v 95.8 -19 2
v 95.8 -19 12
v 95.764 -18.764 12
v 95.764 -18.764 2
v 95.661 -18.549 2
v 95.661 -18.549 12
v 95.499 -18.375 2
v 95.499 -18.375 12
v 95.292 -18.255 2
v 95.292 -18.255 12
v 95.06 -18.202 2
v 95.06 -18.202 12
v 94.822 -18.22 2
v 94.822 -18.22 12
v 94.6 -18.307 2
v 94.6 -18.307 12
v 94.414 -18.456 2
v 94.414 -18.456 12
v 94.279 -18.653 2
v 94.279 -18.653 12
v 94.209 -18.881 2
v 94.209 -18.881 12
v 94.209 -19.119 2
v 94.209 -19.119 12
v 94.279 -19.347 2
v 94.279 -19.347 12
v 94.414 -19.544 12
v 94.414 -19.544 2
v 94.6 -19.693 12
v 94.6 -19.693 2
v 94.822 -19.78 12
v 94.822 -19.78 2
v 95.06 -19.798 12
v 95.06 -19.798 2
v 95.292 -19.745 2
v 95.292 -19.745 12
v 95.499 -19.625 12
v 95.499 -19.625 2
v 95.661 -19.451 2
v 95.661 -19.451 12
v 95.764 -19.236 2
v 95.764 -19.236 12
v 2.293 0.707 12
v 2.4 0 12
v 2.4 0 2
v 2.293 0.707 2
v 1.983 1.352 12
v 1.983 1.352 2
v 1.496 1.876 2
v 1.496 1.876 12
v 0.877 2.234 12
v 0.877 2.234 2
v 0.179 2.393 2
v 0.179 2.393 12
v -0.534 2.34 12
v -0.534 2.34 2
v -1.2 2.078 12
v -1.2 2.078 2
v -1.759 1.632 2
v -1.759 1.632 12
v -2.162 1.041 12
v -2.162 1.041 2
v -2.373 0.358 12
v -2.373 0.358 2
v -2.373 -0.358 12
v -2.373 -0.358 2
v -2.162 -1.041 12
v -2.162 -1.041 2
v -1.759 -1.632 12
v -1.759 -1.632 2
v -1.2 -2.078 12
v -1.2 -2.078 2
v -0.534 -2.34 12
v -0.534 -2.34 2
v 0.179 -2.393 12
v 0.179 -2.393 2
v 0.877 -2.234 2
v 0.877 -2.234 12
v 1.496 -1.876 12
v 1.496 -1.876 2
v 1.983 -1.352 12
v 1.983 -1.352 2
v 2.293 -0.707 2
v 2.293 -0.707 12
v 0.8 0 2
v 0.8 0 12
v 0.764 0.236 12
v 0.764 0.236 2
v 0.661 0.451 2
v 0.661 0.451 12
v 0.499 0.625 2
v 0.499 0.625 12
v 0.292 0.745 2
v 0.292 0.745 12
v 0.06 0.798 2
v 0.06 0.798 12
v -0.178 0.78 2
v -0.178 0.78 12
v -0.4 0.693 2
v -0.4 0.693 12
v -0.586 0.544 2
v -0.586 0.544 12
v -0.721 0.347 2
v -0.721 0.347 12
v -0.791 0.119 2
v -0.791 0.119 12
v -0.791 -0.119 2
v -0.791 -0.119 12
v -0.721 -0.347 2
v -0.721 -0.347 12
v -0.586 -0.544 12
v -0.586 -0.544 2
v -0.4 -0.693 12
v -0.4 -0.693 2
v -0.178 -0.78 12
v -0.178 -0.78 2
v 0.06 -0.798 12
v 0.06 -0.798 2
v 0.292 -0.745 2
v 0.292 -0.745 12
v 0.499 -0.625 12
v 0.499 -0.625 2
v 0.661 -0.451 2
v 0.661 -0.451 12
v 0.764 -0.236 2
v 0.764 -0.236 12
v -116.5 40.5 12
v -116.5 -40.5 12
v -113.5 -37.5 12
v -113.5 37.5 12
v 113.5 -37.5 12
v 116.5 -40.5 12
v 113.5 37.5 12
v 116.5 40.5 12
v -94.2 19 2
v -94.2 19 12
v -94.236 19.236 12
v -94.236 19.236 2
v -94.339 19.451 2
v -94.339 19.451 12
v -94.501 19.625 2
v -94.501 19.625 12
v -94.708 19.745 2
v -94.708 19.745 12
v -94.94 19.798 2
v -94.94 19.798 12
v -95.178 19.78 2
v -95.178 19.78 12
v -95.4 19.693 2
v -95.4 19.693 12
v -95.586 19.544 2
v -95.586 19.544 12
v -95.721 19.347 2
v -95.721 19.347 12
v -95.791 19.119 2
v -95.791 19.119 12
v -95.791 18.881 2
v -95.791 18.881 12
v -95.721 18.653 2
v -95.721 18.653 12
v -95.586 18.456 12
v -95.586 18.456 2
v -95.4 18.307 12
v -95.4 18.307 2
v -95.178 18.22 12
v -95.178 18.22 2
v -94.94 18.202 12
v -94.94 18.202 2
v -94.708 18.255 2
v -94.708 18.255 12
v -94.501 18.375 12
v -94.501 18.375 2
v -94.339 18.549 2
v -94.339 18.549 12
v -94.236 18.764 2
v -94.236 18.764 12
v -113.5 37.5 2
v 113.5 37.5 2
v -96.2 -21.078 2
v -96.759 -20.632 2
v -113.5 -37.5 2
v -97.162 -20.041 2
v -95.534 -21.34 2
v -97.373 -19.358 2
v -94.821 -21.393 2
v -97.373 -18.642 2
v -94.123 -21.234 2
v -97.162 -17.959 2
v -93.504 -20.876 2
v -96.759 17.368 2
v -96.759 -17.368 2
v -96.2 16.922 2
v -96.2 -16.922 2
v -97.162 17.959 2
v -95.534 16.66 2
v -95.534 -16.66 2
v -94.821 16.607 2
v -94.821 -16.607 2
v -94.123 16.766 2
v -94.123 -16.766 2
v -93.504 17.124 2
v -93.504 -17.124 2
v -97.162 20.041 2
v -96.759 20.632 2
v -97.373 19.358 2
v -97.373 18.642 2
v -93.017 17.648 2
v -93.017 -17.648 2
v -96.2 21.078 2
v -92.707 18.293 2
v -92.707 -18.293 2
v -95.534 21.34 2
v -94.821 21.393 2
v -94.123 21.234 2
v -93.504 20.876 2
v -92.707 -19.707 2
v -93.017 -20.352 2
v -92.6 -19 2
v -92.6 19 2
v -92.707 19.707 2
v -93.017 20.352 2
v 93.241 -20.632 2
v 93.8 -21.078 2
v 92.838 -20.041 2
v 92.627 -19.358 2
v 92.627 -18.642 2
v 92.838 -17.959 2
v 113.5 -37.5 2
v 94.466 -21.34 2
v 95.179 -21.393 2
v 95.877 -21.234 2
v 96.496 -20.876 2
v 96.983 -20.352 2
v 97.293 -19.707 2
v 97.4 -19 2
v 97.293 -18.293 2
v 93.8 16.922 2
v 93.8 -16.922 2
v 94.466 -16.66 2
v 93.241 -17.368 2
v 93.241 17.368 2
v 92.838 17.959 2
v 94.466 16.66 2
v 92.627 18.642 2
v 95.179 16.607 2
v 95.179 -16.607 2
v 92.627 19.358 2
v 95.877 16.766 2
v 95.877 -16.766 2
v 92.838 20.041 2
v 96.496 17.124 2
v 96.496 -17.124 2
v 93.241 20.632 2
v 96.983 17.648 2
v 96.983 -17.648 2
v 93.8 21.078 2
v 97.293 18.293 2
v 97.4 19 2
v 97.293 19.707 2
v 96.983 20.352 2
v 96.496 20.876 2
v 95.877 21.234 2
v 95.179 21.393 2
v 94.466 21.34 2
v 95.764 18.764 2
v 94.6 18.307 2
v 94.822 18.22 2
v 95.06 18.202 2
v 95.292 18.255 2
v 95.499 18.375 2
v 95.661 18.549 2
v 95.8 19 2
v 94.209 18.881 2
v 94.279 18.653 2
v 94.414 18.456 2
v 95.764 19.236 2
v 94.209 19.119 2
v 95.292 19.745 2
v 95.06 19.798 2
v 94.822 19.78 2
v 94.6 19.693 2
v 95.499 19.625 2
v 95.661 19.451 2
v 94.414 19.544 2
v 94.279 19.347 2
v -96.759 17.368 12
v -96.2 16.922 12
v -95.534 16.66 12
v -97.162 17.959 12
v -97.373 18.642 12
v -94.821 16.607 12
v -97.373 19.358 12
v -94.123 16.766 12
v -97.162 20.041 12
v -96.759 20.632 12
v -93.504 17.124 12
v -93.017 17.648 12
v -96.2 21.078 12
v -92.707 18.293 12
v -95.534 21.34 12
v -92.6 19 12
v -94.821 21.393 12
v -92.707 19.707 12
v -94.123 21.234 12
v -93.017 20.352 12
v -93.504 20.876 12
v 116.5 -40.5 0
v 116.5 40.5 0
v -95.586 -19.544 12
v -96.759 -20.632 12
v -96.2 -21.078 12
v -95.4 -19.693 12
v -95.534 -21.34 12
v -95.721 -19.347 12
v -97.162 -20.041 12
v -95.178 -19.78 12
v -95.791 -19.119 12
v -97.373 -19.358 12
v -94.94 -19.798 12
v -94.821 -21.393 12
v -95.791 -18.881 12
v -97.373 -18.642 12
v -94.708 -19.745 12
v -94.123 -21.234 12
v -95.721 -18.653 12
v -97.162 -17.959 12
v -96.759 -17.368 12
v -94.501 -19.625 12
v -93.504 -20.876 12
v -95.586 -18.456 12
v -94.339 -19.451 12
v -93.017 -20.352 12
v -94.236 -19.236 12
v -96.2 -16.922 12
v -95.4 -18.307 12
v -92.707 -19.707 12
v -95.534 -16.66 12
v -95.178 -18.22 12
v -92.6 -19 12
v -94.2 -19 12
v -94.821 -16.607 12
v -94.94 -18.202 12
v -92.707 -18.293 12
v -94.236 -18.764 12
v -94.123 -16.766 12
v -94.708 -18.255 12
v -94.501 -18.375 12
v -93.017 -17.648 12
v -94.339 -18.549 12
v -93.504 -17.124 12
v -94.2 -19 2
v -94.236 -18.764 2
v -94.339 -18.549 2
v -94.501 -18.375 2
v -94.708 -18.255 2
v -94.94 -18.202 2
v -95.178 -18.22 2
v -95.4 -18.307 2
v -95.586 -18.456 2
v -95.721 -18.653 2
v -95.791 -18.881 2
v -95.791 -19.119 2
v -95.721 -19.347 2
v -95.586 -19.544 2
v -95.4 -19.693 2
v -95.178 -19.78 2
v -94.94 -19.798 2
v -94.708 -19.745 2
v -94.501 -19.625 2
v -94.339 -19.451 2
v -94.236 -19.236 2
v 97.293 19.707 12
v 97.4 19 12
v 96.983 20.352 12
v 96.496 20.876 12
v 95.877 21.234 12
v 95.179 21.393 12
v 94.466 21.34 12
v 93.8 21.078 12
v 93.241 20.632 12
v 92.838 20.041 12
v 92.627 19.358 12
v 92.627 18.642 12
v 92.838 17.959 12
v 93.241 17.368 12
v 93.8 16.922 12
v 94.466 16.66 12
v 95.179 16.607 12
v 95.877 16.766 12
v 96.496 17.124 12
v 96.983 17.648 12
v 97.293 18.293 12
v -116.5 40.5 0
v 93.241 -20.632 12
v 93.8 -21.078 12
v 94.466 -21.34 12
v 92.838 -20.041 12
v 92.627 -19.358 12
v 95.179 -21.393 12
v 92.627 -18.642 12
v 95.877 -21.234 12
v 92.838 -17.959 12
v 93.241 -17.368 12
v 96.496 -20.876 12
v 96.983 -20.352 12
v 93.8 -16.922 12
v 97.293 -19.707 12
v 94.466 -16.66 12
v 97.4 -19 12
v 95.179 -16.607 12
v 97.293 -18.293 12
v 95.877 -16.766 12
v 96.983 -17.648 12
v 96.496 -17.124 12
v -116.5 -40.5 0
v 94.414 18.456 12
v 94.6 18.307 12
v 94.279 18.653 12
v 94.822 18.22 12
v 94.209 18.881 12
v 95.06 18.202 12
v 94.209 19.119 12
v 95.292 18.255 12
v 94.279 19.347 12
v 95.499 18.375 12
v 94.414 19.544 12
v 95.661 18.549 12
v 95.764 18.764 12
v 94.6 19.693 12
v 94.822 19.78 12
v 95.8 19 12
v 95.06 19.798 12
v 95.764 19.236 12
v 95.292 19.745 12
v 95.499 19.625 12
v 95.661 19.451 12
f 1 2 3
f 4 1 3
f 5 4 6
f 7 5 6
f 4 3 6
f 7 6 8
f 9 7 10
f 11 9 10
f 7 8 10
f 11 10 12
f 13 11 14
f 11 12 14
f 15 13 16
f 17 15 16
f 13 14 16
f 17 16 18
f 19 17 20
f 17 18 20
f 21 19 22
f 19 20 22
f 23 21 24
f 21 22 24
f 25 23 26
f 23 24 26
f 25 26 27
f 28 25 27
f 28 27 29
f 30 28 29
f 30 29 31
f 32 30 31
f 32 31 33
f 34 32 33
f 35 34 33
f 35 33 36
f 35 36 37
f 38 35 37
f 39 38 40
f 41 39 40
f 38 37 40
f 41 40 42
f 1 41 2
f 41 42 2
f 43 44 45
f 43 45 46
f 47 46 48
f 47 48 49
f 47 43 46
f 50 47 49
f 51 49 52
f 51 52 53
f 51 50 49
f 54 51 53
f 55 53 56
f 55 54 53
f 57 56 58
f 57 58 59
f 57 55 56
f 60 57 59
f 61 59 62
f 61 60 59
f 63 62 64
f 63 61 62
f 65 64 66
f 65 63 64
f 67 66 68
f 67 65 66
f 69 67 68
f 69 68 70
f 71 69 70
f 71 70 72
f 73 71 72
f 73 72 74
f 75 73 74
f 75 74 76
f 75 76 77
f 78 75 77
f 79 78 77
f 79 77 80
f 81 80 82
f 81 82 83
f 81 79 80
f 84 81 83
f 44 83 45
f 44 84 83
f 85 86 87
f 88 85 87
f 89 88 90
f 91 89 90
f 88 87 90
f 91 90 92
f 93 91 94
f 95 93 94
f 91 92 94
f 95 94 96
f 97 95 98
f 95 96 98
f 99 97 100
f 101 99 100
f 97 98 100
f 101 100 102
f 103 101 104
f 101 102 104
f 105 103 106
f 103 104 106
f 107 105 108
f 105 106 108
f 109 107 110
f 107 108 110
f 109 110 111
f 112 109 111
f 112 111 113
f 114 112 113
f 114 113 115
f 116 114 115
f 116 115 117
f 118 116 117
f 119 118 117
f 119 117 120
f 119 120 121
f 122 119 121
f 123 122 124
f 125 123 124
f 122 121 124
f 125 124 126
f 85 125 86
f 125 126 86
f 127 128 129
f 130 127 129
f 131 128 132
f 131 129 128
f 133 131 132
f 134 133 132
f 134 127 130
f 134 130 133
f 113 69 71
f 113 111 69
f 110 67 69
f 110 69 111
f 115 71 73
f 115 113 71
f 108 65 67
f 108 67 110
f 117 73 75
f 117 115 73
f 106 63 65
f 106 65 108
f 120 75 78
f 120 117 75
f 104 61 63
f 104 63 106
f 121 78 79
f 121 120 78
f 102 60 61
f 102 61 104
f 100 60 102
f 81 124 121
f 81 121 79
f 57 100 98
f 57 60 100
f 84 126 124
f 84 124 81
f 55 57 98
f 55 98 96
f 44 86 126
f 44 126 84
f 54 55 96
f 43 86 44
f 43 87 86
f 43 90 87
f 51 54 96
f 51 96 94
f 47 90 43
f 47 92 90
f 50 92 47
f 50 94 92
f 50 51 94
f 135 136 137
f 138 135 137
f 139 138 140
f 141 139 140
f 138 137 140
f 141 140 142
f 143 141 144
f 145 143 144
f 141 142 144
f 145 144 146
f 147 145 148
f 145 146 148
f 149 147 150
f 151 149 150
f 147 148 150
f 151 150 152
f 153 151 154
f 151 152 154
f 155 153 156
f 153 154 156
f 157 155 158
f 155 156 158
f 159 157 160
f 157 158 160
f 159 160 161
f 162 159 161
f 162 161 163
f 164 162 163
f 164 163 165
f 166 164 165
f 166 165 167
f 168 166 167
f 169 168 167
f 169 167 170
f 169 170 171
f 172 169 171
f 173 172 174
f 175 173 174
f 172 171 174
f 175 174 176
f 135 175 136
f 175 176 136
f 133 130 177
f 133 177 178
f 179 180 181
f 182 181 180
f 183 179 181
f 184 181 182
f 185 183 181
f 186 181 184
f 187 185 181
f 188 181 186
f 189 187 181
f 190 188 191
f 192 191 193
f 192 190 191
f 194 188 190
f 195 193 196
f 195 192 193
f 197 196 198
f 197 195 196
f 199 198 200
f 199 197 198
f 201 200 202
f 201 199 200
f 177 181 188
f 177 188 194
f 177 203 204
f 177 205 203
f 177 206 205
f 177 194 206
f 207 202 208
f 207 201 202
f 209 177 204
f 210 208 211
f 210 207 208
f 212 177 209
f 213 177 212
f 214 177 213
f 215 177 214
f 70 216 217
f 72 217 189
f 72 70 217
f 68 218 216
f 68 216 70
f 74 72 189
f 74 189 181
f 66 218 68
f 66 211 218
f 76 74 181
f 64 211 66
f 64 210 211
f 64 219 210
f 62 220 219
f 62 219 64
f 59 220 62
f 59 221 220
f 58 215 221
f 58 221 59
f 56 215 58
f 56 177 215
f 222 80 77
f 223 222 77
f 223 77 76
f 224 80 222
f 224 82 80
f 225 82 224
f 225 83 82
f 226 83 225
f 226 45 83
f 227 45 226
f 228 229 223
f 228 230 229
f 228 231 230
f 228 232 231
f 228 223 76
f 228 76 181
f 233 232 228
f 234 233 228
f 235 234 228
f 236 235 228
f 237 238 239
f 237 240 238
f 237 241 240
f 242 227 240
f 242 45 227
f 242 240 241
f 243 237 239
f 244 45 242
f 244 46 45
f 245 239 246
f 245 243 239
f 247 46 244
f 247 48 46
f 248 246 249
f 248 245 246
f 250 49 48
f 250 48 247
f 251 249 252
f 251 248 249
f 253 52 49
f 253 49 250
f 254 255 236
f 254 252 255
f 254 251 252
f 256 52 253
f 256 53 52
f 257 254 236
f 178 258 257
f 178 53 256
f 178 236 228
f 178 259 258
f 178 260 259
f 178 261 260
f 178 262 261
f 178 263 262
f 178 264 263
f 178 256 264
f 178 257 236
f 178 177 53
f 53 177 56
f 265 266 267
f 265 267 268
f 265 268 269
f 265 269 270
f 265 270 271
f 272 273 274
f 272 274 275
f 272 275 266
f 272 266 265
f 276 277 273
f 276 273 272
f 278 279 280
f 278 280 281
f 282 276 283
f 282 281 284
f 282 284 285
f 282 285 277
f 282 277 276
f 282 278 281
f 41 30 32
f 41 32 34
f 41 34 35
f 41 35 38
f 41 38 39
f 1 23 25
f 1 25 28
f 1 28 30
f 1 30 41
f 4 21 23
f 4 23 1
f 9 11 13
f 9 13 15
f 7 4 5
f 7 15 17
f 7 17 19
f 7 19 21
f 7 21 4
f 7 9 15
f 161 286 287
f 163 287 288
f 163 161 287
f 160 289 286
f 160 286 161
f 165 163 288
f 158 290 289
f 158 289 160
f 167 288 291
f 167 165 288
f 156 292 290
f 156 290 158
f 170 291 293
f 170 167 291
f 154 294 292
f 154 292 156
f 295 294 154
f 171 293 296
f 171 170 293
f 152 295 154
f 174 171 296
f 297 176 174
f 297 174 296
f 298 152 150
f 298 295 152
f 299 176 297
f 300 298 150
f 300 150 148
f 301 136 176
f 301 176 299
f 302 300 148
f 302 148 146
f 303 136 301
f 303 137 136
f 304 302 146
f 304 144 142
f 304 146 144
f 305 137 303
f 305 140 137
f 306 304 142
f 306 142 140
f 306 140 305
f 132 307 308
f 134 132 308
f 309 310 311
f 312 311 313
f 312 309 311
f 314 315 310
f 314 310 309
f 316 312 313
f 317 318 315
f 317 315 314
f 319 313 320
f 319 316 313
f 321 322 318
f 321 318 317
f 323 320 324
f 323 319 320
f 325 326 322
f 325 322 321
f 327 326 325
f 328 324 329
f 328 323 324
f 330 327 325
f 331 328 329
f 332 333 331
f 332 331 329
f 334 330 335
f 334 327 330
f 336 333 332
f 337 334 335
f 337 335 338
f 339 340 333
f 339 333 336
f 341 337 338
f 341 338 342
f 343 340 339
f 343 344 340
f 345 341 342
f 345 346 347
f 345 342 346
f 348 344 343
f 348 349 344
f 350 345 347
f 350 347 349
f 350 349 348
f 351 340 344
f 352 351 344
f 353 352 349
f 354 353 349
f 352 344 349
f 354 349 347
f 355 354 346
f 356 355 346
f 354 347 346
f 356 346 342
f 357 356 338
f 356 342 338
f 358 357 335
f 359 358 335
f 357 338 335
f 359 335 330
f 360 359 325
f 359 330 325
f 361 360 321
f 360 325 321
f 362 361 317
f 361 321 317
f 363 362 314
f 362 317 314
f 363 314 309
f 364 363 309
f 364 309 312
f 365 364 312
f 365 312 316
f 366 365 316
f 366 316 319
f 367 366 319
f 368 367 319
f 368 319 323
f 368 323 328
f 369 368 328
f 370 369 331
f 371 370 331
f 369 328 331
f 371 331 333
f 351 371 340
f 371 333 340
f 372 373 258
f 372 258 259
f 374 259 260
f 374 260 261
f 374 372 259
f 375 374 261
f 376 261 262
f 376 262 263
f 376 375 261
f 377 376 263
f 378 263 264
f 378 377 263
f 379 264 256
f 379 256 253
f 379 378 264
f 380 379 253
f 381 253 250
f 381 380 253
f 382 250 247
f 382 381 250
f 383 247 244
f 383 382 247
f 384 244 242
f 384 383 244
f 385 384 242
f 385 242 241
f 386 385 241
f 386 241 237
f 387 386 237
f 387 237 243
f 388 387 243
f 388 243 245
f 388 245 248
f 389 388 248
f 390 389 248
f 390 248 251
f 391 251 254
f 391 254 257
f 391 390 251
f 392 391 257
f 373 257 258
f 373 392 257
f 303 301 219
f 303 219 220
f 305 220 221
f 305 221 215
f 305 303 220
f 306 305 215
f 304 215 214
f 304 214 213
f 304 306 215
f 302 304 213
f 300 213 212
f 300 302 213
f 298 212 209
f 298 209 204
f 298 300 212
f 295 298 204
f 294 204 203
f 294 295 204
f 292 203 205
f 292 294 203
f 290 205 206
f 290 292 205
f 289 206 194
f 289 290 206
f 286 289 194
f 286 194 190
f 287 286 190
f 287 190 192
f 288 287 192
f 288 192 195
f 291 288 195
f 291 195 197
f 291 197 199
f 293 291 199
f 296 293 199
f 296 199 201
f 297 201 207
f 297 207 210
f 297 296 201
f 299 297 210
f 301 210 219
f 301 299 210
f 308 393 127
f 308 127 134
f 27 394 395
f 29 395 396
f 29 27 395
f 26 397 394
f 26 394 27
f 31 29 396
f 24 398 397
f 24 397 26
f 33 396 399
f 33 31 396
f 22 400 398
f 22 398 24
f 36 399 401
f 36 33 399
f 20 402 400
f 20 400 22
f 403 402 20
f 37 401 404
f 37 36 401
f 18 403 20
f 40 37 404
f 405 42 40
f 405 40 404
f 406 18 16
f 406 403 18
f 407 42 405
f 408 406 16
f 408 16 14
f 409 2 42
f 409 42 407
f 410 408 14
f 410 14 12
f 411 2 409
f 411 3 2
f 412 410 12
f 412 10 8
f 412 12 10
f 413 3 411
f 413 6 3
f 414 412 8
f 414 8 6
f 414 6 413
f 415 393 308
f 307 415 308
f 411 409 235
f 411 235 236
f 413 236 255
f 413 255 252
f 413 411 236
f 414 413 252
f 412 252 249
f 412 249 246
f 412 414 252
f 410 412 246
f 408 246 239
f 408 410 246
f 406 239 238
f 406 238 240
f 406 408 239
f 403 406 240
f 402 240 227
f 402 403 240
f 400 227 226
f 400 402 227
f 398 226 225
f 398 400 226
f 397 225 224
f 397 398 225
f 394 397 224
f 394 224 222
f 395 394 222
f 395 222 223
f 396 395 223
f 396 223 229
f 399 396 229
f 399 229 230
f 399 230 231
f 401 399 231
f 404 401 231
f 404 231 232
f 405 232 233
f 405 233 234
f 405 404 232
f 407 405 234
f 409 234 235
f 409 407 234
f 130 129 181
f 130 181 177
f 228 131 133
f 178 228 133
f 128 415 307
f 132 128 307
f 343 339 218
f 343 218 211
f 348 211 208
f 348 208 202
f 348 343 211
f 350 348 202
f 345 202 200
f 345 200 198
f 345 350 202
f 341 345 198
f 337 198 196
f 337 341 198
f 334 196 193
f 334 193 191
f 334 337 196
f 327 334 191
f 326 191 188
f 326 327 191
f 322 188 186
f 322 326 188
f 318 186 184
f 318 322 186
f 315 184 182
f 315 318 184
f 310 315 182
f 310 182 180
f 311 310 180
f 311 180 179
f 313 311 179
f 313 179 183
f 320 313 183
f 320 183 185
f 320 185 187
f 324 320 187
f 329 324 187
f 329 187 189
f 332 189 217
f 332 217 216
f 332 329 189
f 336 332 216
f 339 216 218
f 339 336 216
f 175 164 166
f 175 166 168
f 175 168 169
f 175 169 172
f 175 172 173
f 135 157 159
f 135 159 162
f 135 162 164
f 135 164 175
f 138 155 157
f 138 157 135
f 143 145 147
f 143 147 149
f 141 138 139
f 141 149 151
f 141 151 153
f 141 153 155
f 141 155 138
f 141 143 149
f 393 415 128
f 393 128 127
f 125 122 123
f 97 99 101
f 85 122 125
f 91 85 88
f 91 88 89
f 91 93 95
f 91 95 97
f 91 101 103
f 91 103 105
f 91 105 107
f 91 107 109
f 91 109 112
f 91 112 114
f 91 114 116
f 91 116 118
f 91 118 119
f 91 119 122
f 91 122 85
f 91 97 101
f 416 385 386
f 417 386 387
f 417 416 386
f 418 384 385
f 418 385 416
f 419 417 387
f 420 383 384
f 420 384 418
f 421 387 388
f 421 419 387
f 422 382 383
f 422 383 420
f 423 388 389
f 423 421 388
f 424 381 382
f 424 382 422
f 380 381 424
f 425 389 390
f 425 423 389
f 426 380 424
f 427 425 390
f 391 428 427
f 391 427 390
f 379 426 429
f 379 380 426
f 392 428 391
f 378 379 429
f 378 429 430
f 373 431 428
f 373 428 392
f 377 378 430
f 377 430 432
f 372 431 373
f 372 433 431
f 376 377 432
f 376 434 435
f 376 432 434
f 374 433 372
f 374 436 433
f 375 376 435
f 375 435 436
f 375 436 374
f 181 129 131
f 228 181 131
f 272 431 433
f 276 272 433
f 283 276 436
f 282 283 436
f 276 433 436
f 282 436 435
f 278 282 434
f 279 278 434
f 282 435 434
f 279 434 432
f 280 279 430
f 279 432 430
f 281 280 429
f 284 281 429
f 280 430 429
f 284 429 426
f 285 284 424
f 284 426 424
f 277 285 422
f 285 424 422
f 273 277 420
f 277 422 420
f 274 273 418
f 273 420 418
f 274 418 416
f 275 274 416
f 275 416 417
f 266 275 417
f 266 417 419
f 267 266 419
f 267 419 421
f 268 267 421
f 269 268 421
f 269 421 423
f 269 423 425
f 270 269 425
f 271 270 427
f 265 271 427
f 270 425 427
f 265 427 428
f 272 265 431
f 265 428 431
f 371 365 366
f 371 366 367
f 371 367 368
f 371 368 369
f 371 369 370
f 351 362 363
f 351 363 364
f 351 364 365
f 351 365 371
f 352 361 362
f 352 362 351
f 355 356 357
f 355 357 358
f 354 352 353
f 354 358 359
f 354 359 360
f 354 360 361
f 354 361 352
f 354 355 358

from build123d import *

# Parameters (mm, degrees)
F0_W     = 233
F0_H     = 81
F1_DEPTH = 12
F2_W     = 227
F2_H     = 75
F2_R     = 2.4
F2_R_2   = 0.8
F3_DEPTH = 10


with BuildPart() as f1:
    # F0 (on Top) → F1 (new body)
    with BuildSketch(Plane.XY):
        Rectangle(F0_W, F0_H)
    extrude(amount=F1_DEPTH)

    # F2 (on face) → F3 (cut)
    with BuildSketch(Plane.XY.offset(12)):
        Rectangle(F2_W, F2_H)
        with Locations((-95, -19)):
            Circle(F2_R, mode=Mode.SUBTRACT)
        with Locations((95, -19)):
            Circle(F2_R, mode=Mode.SUBTRACT)
        with Locations((-95, 19)):
            Circle(F2_R, mode=Mode.SUBTRACT)
        Circle(F2_R, mode=Mode.SUBTRACT)
        with Locations((95, 19)):
            Circle(F2_R, mode=Mode.SUBTRACT)
        with Locations((-95, 19)):
            Circle(F2_R_2)
        with Locations((-95, -19)):
            Circle(F2_R_2)
        Circle(F2_R_2)
        with Locations((95, 19)):
            Circle(F2_R_2)
        with Locations((95, -19)):
            Circle(F2_R_2)
    extrude(amount=-F3_DEPTH, mode=Mode.SUBTRACT)


solid = f1.part
